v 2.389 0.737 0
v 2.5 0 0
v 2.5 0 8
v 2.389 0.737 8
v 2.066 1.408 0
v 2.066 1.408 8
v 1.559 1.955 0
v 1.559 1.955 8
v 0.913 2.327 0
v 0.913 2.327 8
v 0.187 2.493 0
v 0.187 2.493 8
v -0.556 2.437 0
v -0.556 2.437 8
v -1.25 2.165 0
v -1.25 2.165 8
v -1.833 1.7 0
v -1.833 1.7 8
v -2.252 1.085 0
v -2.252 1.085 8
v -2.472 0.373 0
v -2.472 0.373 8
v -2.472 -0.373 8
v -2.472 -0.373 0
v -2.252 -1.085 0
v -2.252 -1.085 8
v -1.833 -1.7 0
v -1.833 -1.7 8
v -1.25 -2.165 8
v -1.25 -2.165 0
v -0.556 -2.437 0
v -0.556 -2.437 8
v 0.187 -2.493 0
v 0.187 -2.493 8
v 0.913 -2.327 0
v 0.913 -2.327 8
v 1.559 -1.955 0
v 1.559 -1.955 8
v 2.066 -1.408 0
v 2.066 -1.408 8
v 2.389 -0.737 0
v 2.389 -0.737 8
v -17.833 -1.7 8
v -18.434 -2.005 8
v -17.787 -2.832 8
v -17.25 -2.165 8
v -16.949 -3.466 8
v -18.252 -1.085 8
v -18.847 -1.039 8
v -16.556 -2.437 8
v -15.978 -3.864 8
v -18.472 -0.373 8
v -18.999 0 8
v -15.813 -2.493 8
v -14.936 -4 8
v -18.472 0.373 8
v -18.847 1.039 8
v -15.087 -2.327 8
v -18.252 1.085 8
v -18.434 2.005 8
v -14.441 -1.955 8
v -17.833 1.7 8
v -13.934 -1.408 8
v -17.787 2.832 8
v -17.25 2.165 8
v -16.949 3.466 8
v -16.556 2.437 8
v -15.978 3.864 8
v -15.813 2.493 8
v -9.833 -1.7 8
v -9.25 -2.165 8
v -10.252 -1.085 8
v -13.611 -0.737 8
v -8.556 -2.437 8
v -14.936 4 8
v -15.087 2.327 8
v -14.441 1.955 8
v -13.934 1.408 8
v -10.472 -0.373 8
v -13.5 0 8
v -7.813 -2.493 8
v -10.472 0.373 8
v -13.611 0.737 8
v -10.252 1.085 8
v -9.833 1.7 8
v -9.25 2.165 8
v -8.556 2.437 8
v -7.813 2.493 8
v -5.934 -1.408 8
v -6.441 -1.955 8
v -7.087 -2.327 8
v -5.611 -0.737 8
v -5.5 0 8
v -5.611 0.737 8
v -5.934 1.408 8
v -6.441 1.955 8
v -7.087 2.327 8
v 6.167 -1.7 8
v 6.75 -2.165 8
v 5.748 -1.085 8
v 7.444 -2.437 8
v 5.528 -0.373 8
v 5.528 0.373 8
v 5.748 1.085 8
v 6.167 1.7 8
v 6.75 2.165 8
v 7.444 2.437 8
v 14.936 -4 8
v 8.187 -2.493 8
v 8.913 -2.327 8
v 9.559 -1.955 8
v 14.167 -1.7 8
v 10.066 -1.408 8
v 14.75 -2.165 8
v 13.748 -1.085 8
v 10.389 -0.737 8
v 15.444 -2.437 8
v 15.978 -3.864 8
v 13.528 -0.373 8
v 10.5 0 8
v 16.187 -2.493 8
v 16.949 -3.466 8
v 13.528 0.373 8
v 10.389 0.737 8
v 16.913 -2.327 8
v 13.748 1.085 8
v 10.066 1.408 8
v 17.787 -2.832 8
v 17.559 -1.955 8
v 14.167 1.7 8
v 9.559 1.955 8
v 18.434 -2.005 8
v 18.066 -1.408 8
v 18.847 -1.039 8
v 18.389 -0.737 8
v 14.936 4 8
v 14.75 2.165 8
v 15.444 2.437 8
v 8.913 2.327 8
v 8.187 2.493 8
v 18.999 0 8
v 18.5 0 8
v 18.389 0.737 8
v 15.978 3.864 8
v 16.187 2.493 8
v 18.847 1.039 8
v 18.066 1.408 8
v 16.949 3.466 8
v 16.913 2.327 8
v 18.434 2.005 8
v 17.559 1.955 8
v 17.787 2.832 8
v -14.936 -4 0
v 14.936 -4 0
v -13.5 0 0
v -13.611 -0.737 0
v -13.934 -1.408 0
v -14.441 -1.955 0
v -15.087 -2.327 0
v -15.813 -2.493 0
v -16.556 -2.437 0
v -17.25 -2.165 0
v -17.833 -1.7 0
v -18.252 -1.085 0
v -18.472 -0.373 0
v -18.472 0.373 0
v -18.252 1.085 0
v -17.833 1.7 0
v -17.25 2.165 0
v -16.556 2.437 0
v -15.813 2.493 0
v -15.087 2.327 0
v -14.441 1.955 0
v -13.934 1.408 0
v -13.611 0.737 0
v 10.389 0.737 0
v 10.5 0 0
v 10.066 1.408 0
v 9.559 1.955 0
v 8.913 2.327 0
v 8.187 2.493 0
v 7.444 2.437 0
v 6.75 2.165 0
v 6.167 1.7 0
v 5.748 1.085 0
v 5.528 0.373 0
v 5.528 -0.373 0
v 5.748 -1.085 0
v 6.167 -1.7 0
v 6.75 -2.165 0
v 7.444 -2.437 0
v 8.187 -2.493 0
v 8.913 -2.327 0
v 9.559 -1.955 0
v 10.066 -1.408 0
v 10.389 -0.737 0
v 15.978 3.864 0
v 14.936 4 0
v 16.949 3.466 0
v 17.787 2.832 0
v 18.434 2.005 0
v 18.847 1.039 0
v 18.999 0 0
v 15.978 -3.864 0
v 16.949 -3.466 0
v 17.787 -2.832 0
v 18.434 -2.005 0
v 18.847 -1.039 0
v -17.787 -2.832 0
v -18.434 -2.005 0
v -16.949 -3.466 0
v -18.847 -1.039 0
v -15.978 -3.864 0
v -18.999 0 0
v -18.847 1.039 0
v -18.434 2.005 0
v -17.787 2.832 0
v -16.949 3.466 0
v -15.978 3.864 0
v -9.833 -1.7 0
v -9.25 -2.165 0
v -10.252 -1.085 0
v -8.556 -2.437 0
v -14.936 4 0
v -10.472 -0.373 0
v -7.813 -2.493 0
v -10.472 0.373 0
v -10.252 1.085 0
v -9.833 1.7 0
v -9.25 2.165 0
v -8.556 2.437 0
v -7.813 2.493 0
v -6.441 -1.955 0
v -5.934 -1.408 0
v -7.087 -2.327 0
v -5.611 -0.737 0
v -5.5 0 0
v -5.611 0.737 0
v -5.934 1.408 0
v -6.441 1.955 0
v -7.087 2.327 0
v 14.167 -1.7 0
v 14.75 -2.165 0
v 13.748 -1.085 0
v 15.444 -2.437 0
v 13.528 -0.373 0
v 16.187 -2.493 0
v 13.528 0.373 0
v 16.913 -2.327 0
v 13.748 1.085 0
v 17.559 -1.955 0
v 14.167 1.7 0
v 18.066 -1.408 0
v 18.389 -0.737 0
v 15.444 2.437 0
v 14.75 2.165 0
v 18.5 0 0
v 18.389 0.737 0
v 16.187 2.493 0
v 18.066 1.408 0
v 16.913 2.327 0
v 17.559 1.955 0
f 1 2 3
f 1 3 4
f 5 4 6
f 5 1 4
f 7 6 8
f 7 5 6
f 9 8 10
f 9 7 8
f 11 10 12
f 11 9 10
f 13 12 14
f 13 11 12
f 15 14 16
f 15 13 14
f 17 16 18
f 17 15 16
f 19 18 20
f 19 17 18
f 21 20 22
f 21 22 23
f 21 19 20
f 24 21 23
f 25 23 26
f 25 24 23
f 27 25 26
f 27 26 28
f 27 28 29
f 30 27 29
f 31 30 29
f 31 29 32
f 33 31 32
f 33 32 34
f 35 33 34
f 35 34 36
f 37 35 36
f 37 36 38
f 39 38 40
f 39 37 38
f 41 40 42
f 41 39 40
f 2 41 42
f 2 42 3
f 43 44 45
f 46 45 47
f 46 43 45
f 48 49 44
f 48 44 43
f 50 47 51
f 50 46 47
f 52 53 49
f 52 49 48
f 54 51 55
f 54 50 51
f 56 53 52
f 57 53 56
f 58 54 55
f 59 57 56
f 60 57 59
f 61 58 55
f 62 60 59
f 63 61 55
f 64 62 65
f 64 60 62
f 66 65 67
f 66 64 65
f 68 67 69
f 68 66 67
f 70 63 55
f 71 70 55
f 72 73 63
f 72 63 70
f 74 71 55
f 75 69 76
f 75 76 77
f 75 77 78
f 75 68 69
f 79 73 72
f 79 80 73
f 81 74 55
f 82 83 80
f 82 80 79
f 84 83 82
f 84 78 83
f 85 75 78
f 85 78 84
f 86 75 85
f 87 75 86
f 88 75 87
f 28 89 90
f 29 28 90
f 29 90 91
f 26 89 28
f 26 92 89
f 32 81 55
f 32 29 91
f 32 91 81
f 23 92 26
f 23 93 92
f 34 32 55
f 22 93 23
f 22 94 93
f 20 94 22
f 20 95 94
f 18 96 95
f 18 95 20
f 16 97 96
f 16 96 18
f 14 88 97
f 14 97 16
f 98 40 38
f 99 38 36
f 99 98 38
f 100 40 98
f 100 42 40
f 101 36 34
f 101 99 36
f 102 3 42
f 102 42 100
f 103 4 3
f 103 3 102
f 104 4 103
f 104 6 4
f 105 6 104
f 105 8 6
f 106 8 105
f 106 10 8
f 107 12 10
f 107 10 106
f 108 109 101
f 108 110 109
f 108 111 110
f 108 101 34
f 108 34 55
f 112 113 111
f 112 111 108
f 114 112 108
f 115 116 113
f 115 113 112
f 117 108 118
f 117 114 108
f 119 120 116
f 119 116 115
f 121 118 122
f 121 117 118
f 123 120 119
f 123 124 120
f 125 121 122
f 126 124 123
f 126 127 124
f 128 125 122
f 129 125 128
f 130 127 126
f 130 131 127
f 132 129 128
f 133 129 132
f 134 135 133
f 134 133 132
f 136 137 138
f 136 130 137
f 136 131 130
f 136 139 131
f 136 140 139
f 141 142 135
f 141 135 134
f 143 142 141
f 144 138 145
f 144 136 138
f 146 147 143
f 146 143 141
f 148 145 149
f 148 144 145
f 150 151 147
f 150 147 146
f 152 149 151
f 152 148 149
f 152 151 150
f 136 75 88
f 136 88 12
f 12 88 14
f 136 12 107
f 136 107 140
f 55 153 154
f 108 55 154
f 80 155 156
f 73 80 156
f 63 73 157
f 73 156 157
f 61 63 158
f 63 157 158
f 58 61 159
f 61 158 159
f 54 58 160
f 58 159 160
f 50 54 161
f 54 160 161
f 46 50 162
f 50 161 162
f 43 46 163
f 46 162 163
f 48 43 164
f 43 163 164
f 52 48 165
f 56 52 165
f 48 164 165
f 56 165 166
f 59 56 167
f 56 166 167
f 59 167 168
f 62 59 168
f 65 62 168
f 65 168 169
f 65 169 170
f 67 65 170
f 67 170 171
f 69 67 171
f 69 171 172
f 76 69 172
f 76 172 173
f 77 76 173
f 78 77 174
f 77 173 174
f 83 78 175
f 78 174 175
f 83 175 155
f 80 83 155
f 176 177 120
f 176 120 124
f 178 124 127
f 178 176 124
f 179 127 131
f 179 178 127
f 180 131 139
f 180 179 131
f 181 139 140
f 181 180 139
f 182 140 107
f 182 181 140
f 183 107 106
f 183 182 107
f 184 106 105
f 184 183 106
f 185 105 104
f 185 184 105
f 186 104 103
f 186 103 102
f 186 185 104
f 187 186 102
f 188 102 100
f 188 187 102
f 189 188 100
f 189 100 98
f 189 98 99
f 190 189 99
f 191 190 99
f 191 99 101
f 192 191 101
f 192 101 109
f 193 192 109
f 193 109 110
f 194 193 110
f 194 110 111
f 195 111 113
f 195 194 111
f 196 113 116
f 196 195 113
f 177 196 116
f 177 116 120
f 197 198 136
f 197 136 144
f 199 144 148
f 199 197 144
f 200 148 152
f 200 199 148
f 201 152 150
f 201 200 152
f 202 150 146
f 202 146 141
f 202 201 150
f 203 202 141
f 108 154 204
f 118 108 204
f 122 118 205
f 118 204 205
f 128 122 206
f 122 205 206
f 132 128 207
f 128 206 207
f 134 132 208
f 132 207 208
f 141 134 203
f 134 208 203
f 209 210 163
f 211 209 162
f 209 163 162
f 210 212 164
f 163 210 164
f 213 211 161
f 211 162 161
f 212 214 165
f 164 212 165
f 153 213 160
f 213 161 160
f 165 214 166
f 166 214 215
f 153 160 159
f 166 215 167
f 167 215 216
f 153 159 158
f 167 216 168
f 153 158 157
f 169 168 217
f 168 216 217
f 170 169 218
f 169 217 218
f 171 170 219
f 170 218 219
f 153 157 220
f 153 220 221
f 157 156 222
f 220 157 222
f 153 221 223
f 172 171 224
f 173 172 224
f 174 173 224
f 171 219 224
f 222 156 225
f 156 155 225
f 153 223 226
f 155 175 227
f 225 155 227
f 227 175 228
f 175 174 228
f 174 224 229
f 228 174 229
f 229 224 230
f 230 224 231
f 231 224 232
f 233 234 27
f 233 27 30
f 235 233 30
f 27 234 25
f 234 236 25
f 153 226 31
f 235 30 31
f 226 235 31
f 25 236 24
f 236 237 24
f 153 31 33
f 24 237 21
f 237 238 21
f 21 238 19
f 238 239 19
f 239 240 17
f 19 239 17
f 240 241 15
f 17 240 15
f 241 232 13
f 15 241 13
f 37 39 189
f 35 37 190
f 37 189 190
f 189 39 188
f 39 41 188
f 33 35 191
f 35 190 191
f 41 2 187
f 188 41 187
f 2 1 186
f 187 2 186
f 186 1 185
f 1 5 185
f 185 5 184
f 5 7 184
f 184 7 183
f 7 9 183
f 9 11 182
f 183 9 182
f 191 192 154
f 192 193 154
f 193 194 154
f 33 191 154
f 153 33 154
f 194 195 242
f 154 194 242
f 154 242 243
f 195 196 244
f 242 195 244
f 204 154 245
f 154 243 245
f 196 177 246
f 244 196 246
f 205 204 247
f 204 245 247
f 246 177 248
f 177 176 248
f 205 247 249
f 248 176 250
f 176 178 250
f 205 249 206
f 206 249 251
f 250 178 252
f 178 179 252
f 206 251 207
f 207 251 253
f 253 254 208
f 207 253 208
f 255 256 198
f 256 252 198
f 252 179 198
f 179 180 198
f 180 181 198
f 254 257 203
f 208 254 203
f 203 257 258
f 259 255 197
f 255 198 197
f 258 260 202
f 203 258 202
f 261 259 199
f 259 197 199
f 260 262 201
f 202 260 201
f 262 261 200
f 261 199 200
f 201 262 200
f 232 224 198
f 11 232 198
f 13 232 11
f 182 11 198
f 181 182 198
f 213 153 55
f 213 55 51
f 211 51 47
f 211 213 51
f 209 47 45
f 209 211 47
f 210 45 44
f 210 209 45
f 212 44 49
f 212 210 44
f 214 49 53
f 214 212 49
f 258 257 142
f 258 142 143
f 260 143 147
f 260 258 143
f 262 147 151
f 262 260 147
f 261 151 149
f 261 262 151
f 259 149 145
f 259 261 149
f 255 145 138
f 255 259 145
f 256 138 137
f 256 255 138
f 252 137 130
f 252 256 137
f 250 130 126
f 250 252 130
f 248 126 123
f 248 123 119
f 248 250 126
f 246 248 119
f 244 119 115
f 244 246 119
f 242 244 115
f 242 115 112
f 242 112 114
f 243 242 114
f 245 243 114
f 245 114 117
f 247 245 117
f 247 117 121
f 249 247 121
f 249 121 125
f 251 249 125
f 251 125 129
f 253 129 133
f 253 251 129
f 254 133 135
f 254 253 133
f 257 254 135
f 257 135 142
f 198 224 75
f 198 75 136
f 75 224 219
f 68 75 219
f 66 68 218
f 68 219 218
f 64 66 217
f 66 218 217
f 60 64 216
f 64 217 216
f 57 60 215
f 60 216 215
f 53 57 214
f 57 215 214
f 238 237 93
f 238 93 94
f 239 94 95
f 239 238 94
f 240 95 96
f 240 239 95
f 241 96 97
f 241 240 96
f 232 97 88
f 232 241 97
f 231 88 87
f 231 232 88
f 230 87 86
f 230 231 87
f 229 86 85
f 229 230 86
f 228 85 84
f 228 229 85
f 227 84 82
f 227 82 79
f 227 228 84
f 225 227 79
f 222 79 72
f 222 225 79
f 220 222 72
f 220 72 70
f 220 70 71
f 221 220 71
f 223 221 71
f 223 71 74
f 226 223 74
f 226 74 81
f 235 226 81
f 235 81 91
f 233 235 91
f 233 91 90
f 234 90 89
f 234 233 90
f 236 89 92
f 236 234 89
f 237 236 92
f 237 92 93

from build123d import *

# Parameters (mm, degrees)
F0_W        = 38
F0_H        = 8
F0_R        = 2.5
F1_DEPTH    = 8
F2_T1_DEPTH = 28.32


# Not quite as in the source:
# - a fillet or chamfer that OpenCascade refuses, or shapes differently, is made with other operations: its cross-section is extruded or revolved along the edge and cut away or added


with BuildPart() as f1:
    # F0 (on Top) → F1 (new body)
    with BuildSketch(Plane.XY):
        Rectangle(F0_W, F0_H)
        with BuildLine():
            ThreePointArc((-18.5, 0), (-16, 2.5), (-13.5, 0))
            ThreePointArc((-13.5, 0), (-16, -2.5), (-18.5, 0))
        make_face(mode=Mode.SUBTRACT)
        with Locations((-8, 0)):
            Circle(F0_R, mode=Mode.SUBTRACT)
        Circle(F0_R, mode=Mode.SUBTRACT)
        with Locations((8, 0)):
            Circle(F0_R, mode=Mode.SUBTRACT)
        with Locations((16, 0)):
            Circle(F0_R, mode=Mode.SUBTRACT)
    extrude(amount=F1_DEPTH)

    # F2: fillet of radius 4.064 on 4 edges, made by hand

    # F2_s2 → F2_t1 (cut)
    with BuildSketch(Plane.XY.offset(-10.16)):
        with BuildLine():
            ThreePointArc((14.936, -4), (17.8096819587, -2.8096819587), (19, 0.064))
            Line((19, 0.064), (19, -4))
            Line((19, -4), (14.936, -4))
        make_face()
        with BuildLine():
            ThreePointArc((14.936, 4), (17.8096819587, 2.8096819587), (19, -0.064))
            Line((19, -0.064), (19, 4))
            Line((19, 4), (14.936, 4))
        make_face()
        with BuildLine():
            ThreePointArc((-14.936, -4), (-17.8096819587, -2.8096819587), (-19, 0.064))
            Line((-19, 0.064), (-19, -4))
            Line((-19, -4), (-14.936, -4))
        make_face()
        with BuildLine():
            ThreePointArc((-14.936, 4), (-17.8096819587, 2.8096819587), (-19, -0.064))
            Line((-19, -0.064), (-19, 4))
            Line((-19, 4), (-14.936, 4))
        make_face()
    extrude(amount=F2_T1_DEPTH, mode=Mode.SUBTRACT)


solid = f1.part
